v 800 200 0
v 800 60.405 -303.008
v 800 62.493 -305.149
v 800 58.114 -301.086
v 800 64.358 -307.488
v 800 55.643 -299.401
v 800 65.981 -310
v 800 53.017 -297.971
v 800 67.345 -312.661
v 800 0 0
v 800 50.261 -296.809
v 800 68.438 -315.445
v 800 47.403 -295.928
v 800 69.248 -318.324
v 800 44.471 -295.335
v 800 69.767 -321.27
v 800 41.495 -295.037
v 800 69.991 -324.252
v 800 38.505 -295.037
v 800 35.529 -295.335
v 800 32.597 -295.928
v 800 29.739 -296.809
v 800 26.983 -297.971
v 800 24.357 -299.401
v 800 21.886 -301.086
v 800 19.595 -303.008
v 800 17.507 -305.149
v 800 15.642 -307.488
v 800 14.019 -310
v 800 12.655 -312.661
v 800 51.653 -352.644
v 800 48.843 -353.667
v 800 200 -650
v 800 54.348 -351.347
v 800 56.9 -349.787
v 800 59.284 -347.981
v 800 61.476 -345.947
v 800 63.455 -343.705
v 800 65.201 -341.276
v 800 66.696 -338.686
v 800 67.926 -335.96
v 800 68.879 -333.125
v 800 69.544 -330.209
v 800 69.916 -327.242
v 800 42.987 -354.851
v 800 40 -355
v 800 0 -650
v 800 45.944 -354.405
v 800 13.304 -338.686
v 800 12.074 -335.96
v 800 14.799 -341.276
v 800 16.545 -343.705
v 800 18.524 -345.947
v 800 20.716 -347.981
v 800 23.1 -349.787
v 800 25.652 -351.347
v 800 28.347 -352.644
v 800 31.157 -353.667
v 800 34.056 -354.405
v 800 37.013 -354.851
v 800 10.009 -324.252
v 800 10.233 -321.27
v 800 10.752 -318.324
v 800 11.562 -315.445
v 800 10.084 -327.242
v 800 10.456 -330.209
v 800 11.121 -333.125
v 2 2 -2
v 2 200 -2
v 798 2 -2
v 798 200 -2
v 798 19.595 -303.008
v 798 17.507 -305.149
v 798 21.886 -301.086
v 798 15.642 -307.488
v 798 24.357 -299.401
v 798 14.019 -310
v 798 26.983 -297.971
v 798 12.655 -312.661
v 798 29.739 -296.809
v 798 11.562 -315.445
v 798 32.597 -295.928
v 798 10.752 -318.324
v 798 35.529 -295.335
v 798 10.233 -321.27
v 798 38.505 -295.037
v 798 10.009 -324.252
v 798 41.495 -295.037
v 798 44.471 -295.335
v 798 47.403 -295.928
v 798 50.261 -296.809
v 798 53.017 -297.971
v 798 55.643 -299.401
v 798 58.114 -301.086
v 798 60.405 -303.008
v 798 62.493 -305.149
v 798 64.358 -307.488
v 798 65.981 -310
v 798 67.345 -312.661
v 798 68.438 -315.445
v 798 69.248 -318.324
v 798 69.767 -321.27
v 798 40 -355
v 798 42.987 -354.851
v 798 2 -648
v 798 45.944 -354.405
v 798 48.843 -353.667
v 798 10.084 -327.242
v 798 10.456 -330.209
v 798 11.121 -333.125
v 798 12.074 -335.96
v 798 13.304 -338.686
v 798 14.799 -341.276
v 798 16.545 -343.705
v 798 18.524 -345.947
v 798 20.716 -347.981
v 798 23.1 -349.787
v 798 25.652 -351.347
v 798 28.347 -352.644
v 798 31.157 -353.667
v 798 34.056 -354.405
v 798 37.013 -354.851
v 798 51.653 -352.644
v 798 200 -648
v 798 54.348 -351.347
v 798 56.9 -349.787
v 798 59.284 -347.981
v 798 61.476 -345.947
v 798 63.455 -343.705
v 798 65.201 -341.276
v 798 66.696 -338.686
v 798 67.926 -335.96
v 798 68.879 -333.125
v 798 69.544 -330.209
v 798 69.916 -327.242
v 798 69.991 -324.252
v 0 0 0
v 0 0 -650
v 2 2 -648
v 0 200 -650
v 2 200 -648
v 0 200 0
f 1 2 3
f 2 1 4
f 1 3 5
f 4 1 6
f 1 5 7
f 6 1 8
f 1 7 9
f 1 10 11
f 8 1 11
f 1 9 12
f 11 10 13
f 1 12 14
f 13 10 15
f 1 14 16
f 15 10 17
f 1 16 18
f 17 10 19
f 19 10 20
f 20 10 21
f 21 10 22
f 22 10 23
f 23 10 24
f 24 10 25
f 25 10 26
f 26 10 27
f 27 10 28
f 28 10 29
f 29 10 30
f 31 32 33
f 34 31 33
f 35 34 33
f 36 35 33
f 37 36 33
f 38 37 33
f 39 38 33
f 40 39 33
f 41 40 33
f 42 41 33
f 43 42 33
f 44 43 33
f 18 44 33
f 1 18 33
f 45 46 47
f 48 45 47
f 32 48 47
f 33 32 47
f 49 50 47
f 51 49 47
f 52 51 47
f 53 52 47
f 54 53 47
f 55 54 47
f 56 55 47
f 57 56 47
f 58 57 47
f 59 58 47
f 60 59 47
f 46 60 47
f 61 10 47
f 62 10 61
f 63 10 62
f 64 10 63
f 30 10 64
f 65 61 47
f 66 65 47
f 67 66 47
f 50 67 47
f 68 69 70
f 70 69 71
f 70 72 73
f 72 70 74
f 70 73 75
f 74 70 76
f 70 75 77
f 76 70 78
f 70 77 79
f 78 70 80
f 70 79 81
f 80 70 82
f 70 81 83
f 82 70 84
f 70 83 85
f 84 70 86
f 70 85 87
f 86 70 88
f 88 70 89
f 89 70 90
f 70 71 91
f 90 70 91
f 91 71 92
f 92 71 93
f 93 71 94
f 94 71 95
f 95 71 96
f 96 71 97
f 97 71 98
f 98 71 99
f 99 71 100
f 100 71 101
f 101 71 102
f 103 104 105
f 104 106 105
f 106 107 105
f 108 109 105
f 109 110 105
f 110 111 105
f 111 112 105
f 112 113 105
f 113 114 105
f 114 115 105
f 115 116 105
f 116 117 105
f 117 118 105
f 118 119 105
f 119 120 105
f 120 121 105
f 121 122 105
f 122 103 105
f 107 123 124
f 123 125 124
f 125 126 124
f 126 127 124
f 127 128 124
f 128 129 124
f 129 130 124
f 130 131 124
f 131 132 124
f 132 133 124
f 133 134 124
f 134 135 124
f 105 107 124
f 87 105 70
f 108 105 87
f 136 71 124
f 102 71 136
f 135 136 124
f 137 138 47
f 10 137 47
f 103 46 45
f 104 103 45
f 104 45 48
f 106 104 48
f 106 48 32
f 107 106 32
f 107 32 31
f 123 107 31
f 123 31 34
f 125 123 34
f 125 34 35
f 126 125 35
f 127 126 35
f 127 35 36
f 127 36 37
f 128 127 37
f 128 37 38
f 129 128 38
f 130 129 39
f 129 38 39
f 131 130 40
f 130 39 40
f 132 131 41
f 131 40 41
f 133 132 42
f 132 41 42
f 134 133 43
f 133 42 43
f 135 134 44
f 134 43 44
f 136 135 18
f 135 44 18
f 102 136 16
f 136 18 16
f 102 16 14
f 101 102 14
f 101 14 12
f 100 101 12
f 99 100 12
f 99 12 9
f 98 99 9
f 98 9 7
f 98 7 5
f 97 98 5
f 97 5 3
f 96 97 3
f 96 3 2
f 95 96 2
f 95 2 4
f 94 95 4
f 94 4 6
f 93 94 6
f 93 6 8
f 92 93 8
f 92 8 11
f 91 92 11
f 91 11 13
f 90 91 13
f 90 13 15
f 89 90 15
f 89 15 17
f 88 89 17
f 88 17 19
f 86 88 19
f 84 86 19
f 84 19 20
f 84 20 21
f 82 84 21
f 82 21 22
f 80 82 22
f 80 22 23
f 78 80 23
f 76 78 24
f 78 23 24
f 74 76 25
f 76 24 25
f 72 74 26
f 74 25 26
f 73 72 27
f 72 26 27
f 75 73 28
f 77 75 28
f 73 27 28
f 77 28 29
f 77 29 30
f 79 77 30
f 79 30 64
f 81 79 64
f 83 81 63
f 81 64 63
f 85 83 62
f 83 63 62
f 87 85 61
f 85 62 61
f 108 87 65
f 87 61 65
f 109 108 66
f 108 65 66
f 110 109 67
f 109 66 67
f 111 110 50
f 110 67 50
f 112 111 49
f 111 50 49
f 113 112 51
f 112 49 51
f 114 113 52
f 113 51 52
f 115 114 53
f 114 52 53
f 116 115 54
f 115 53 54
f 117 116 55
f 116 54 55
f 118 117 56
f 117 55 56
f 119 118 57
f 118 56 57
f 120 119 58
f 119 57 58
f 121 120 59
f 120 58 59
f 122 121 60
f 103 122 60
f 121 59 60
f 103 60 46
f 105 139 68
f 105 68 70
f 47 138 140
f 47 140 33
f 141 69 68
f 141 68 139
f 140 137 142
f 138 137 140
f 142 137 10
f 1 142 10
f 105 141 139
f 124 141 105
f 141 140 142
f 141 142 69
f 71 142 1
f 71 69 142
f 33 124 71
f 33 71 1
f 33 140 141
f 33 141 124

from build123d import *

# Parameters (mm, degrees)
SKETCH1_W           = 800
SKETCH1_H           = 650
BOSS_EXTRUDE1_DEPTH = 200
SKETCH2_W           = 796
SKETCH2_H           = 646
CUT_EXTRUDE1_DEPTH  = 198
CUT_EXTRUDE3_REACH  = 802
SKETCH4_R           = 30


with BuildPart() as part:
    # Sketch1 → Boss-Extrude1 (new body)
    with BuildSketch(Plane(origin=(0, 0, 0), x_dir=(1, 0, 0), z_dir=(0, 1, 0))):
        with Locations((400, 325)):
            Rectangle(SKETCH1_W, SKETCH1_H)
    extrude(amount=BOSS_EXTRUDE1_DEPTH)

    # Sketch2 → Cut-Extrude1 (cut)
    with BuildSketch(Plane(origin=(0, 200, 0), x_dir=(1, 0, 0), z_dir=(0, 1, 0))):
        with Locations((400, 325)):
            Rectangle(SKETCH2_W, SKETCH2_H)
    extrude(amount=-CUT_EXTRUDE1_DEPTH, mode=Mode.SUBTRACT)

    # Sketch4 → Cut-Extrude3 (cut, up to next)
    with BuildSketch(Plane(origin=(800, 0, 0), x_dir=(0, 0, -1), z_dir=(1, 0, 0)), mode=Mode.PRIVATE) as cut_extrude3_sk1:
        with Locations((325, 40)):
            Circle(SKETCH4_R)
    cut_extrude3_tool1 = extrude(cut_extrude3_sk1.sketch, amount=-CUT_EXTRUDE3_REACH, mode=Mode.PRIVATE) & part.part
    add(cut_extrude3_tool1.solids().sort_by_distance((800, 40, -325))[0], mode=Mode.SUBTRACT)


solid = part.part
